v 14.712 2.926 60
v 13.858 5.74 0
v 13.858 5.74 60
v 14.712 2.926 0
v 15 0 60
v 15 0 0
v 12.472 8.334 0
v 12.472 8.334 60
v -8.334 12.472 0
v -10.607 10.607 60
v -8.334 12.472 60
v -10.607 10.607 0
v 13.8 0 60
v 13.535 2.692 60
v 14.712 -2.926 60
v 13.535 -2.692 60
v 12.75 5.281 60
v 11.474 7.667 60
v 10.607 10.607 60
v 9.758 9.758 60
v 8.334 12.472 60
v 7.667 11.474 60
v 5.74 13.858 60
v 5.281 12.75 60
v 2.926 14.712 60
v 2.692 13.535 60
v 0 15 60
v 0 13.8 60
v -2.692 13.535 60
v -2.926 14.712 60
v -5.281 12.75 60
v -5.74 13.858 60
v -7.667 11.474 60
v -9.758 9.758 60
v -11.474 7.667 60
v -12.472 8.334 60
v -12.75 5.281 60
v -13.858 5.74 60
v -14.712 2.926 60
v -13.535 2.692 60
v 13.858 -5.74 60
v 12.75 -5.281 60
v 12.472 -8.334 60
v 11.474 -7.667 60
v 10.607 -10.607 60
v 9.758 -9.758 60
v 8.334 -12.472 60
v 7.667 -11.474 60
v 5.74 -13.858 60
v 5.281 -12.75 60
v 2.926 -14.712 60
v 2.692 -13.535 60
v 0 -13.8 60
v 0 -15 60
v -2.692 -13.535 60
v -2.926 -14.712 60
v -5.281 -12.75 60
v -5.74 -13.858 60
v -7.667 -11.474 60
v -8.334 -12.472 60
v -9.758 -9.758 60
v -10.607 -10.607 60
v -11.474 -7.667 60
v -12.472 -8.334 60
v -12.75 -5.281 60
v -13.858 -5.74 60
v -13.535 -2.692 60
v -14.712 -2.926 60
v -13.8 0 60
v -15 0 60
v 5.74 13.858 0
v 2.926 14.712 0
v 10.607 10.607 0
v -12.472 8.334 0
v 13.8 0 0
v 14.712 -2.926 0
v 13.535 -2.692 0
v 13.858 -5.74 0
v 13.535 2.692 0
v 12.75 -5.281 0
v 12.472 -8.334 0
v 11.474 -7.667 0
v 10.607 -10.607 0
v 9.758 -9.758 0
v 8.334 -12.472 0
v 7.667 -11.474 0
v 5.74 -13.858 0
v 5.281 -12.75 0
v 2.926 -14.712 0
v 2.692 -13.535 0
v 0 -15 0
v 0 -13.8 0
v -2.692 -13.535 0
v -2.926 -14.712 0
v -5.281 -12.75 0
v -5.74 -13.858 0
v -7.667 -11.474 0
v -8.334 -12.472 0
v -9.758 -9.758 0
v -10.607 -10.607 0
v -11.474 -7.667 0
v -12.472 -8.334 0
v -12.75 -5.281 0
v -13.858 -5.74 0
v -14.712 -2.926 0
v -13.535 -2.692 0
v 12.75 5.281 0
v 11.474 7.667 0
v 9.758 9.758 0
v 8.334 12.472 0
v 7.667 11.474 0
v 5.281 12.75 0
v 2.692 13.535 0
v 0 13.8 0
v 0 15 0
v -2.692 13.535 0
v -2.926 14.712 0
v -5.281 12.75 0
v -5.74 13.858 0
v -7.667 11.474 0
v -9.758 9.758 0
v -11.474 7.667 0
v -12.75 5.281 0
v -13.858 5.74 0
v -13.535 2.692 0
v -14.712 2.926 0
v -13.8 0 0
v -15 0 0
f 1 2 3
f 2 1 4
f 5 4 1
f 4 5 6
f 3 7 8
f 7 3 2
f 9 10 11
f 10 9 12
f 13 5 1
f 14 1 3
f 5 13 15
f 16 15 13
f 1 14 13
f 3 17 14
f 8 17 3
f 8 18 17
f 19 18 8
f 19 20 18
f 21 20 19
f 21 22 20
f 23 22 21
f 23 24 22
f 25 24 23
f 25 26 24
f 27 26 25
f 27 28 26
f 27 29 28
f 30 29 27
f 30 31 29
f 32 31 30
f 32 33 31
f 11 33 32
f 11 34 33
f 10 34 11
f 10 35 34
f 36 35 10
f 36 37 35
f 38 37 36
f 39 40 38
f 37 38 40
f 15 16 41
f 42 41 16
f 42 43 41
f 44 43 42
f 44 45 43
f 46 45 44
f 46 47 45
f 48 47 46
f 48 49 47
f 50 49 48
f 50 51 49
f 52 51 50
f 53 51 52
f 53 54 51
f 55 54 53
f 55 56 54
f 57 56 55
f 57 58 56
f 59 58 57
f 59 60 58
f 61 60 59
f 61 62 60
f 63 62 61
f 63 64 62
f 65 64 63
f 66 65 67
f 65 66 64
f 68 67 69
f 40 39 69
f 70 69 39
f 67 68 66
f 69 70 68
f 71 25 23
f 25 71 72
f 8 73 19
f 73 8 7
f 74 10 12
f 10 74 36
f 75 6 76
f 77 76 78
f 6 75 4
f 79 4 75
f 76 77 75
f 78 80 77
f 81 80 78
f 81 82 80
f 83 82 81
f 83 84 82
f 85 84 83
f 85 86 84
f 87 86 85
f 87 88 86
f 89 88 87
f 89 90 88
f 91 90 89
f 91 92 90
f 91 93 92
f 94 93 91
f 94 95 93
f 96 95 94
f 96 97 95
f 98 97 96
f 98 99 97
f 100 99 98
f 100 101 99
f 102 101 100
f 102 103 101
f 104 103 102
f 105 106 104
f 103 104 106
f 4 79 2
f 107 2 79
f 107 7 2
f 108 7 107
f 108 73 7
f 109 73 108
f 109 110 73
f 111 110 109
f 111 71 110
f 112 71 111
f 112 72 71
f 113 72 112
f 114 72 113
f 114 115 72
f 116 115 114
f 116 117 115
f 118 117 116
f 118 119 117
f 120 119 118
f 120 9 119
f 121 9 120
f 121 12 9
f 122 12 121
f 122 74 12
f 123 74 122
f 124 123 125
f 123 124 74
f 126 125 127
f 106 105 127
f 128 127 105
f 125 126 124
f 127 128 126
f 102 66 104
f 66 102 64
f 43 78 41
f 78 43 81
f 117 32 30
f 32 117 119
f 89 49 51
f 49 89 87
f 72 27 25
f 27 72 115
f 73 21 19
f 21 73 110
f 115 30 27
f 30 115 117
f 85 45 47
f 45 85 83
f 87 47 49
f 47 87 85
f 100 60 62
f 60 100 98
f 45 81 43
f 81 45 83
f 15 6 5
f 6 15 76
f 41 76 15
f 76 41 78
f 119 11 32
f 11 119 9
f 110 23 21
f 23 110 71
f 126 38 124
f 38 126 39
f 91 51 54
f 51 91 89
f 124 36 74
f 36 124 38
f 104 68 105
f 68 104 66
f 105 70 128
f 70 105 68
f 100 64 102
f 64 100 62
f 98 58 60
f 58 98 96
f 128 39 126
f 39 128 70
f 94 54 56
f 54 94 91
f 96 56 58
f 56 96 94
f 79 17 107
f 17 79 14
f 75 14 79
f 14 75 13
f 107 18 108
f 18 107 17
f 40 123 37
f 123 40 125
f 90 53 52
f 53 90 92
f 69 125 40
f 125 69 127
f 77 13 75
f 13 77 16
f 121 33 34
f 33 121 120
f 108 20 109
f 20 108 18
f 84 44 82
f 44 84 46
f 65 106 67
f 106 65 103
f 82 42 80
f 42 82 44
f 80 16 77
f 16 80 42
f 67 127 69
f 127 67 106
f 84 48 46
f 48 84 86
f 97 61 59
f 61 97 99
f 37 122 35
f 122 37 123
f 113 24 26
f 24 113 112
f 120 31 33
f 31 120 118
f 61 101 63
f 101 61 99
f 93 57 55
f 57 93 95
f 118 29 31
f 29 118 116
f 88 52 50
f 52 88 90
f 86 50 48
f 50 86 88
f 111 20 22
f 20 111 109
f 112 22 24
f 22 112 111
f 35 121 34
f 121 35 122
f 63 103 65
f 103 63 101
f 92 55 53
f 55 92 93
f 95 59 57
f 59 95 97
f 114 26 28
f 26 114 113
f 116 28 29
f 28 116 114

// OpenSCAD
$fn = 32;

// ----------------------------------------------------------------------
// Thin tube: 1.2 mm wall
// ----------------------------------------------------------------------

// --- parameters (mm) ---
tube_od = 30;             // outer diameter
tube_h = 60;              // height, Z
wall = 1.2;               // wall thickness
fit_tol = 0.1;            // tolerance for press fits, mm
free_tol = 0.3;           // tolerance for clearance fits, mm

difference() {
  cylinder(h = tube_h, d = tube_od);
  translate([0, 0, -1]) cylinder(h = tube_h + 2, d = tube_od - 2 * wall);
}
